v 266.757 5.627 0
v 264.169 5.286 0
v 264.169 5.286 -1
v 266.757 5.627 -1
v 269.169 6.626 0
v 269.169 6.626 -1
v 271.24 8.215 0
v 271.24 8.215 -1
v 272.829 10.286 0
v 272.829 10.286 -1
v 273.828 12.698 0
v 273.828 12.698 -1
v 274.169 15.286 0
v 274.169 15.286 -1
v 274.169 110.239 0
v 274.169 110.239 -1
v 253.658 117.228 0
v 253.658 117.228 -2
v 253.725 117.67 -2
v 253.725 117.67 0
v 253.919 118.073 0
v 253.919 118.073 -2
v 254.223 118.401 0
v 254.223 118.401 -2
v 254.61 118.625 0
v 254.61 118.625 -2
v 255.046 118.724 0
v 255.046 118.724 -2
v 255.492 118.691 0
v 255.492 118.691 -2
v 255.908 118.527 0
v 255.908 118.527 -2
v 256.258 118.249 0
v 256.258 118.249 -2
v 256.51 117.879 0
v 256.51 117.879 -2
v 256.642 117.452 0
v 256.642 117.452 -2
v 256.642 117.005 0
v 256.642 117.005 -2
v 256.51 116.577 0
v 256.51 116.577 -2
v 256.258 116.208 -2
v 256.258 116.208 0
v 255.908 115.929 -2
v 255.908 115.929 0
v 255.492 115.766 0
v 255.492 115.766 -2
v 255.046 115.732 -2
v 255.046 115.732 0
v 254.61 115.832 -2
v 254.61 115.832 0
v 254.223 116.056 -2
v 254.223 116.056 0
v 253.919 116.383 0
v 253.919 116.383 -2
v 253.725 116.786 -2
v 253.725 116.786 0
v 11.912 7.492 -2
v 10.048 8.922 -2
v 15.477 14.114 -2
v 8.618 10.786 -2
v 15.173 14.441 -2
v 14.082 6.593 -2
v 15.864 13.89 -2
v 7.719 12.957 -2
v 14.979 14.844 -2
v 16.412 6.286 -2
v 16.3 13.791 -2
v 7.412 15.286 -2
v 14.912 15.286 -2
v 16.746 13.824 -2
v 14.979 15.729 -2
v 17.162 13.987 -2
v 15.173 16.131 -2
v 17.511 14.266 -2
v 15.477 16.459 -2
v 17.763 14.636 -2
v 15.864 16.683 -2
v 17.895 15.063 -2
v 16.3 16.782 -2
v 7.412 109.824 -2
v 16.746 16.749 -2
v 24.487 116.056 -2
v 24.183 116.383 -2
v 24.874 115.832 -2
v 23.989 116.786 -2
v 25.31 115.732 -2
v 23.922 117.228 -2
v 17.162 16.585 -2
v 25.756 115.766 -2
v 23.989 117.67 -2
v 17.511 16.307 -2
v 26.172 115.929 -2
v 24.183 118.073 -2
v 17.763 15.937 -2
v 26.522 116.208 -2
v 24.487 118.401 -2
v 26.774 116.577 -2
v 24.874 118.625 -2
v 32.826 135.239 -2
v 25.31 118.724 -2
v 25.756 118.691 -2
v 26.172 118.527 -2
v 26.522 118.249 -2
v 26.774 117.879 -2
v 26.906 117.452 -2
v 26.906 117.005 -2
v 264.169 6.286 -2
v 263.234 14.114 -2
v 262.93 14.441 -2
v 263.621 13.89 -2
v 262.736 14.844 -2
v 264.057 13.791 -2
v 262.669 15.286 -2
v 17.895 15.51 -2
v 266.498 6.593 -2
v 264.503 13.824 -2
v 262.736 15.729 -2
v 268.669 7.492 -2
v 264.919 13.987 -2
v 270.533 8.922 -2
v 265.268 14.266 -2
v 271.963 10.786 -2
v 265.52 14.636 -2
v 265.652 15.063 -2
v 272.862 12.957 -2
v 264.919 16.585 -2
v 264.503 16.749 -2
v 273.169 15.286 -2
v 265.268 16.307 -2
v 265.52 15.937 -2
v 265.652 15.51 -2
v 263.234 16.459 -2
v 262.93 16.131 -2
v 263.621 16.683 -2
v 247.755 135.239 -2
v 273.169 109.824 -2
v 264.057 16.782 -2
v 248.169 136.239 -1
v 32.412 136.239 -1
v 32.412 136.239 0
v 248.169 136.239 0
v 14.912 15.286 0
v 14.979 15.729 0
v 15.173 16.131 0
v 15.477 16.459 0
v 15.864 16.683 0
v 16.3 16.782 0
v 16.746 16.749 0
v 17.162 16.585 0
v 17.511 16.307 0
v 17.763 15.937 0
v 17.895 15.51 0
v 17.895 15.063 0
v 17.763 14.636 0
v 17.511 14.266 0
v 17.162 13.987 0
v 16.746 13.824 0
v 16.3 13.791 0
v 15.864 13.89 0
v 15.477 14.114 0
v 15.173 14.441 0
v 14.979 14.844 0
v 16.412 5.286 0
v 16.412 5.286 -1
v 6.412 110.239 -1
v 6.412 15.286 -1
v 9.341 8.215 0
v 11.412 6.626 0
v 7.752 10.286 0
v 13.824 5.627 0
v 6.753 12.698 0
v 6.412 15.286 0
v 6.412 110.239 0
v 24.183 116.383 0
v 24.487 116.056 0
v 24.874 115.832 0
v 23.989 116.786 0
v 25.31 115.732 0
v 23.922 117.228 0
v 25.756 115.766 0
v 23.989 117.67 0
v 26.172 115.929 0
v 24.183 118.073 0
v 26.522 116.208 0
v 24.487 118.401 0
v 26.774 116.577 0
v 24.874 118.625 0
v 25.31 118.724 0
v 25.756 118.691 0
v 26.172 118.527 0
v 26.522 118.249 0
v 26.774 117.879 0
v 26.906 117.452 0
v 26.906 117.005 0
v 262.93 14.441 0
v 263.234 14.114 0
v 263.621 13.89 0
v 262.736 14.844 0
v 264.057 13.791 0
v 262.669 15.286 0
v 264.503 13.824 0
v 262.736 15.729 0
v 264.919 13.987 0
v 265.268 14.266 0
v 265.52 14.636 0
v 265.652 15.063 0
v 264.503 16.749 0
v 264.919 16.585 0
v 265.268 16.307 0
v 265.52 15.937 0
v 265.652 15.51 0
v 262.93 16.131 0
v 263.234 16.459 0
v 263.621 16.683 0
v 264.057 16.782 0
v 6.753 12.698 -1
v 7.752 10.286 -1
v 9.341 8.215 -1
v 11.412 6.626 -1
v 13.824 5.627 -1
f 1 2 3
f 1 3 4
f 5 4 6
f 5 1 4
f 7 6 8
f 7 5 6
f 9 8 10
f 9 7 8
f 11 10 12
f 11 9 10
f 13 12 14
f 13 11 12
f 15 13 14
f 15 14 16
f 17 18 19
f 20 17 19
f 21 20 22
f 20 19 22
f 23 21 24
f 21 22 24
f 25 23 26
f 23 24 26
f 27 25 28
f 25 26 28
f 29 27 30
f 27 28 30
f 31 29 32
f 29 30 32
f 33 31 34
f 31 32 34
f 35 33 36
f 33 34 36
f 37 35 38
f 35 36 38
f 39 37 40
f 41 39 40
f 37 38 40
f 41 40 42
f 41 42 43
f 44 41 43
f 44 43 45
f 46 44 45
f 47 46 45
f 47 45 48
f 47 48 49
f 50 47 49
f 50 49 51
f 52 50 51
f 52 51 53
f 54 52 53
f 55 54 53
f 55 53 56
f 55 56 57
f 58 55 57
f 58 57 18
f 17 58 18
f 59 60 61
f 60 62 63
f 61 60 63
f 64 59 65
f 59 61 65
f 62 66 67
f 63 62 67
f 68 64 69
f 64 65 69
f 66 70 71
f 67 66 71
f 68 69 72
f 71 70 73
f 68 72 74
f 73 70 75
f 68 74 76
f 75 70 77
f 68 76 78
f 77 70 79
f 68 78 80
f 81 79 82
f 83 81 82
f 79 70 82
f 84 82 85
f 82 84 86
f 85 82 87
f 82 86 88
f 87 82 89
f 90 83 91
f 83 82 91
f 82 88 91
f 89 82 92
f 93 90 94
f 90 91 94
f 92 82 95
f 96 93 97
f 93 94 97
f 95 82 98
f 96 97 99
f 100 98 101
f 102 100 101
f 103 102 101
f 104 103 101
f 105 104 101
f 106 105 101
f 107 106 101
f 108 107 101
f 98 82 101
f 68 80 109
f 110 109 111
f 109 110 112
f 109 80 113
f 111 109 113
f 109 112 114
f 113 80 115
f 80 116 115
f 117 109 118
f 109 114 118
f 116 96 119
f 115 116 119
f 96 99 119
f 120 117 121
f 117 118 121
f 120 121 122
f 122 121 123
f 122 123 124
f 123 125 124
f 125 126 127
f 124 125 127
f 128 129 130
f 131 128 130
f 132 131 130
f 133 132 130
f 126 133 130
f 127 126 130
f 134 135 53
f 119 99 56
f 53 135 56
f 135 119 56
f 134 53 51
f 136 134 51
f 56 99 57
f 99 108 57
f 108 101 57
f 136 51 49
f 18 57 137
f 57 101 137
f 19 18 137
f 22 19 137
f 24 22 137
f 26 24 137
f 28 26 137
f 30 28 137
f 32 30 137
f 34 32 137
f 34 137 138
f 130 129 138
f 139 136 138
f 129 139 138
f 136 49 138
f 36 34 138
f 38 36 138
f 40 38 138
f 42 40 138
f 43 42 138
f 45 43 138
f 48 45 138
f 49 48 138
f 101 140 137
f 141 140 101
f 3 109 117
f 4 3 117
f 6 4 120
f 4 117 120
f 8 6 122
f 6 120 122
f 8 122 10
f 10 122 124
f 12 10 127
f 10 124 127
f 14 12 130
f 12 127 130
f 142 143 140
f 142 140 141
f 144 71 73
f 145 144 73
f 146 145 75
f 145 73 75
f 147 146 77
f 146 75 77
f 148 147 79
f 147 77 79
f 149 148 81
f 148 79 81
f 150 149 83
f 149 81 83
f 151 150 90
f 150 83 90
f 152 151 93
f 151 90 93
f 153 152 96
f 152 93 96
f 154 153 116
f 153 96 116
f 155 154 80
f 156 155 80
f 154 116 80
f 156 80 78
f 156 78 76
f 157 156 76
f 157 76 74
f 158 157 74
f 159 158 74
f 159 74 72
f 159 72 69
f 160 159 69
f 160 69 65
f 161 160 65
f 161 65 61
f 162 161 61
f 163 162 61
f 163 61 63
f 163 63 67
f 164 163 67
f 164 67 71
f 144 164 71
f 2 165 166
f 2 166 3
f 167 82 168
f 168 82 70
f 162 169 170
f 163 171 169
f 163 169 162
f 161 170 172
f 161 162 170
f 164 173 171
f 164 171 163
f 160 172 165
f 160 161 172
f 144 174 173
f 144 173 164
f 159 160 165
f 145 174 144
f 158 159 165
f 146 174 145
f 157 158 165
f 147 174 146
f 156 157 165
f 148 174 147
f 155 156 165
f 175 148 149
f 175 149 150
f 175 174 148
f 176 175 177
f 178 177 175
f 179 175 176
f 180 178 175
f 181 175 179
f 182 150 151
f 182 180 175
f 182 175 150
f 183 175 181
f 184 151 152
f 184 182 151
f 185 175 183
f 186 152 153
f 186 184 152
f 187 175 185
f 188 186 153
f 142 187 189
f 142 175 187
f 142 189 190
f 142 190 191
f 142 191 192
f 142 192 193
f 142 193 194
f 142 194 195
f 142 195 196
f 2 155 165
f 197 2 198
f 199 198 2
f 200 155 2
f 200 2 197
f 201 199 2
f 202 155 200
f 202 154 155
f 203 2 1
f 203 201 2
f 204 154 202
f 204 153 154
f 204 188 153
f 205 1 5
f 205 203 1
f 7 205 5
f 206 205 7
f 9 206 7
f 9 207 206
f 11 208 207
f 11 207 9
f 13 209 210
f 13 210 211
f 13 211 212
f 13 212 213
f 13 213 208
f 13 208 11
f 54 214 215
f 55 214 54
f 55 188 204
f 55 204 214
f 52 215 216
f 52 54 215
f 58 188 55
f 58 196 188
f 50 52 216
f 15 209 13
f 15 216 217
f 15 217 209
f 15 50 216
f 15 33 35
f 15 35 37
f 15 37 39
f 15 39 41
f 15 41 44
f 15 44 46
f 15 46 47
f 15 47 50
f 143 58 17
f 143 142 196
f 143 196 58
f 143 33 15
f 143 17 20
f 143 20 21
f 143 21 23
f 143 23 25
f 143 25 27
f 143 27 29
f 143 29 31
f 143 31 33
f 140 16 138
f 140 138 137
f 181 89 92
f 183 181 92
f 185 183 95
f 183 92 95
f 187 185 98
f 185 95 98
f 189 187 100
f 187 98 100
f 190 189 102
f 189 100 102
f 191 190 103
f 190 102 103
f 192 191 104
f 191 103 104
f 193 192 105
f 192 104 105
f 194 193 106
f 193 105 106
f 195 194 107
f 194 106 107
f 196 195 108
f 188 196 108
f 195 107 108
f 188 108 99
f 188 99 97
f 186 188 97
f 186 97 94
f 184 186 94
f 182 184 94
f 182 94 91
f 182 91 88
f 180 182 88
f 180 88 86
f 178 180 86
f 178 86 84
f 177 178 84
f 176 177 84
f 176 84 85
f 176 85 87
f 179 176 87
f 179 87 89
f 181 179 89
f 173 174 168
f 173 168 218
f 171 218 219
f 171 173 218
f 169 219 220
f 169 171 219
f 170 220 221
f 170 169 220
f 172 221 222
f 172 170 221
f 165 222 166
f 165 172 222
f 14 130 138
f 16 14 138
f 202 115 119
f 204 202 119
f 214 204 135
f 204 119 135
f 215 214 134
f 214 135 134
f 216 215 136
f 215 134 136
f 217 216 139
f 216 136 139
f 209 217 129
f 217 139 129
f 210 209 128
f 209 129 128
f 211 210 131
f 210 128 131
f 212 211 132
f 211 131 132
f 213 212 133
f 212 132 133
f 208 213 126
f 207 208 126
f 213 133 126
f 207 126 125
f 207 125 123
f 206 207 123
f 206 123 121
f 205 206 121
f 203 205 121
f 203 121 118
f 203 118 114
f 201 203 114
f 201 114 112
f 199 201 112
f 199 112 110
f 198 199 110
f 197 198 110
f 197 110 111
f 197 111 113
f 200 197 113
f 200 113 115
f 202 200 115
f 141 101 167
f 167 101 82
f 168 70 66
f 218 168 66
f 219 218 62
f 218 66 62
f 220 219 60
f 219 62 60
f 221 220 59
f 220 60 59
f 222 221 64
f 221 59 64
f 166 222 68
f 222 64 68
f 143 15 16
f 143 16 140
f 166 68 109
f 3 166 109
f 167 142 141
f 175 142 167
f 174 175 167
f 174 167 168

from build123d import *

# Parameters (mm, degrees)
BOSS_EXTRUDE1_DEPTH   = 2
F_3_0MM_DOWEL_HOLE1_D = 3
CHAMFER1_SIZE         = 1


with BuildPart() as part:
    # Sketch2 → Boss-Extrude1 (new body)
    with BuildSketch(Plane.XY):
        with BuildLine():
            Line((6.41186441, 110.238694526), (6.41186441, 15.286374556))
            ThreePointArc((6.41186441, 15.286374556), (9.340796598, 8.215306744), (16.41186441, 5.286374556))
            Line((16.41186441, 5.286374556), (264.168886442, 5.286374556))
            ThreePointArc((264.168886442, 5.286374556), (271.239954254, 8.215306744), (274.168886442, 15.286374556))
            Line((274.168886442, 15.286374556), (274.168886442, 110.238694526))
            Line((274.168886442, 110.238694526), (248.168886442, 136.238694526))
            Line((248.168886442, 136.238694526), (32.41186441, 136.238694526))
            Line((32.41186441, 136.238694526), (6.41186441, 110.238694526))
        make_face()
    extrude(amount=-BOSS_EXTRUDE1_DEPTH)

    # Ø3.0mm Dowel Hole1 (through all)
    with Locations(Plane.XY):
        with Locations((16.41186441, 15.286374556), (25.42227205, 117.228286886), (255.158478802, 117.228286886), (264.168886442, 15.286374556)):
            Hole(F_3_0MM_DOWEL_HOLE1_D / 2)

    # Chamfer1
    chamfer1_edges = [part.edges().sort_by_distance(p)[0] for p in [
        (6.41186441, 62.762534541, -2),
        (9.340796598, 8.215306744, -2),
        (140.290375426, 5.286374556, -2),
        (271.239954254, 8.215306744, -2),
        (19.41186441, 123.238694526, -2),
        (274.168886442, 62.762534541, -2),
        (261.168886442, 123.238694526, -2),
        (140.290375426, 136.238694526, -2),
    ]]
    chamfer(chamfer1_edges, length=CHAMFER1_SIZE)


solid = part.part
